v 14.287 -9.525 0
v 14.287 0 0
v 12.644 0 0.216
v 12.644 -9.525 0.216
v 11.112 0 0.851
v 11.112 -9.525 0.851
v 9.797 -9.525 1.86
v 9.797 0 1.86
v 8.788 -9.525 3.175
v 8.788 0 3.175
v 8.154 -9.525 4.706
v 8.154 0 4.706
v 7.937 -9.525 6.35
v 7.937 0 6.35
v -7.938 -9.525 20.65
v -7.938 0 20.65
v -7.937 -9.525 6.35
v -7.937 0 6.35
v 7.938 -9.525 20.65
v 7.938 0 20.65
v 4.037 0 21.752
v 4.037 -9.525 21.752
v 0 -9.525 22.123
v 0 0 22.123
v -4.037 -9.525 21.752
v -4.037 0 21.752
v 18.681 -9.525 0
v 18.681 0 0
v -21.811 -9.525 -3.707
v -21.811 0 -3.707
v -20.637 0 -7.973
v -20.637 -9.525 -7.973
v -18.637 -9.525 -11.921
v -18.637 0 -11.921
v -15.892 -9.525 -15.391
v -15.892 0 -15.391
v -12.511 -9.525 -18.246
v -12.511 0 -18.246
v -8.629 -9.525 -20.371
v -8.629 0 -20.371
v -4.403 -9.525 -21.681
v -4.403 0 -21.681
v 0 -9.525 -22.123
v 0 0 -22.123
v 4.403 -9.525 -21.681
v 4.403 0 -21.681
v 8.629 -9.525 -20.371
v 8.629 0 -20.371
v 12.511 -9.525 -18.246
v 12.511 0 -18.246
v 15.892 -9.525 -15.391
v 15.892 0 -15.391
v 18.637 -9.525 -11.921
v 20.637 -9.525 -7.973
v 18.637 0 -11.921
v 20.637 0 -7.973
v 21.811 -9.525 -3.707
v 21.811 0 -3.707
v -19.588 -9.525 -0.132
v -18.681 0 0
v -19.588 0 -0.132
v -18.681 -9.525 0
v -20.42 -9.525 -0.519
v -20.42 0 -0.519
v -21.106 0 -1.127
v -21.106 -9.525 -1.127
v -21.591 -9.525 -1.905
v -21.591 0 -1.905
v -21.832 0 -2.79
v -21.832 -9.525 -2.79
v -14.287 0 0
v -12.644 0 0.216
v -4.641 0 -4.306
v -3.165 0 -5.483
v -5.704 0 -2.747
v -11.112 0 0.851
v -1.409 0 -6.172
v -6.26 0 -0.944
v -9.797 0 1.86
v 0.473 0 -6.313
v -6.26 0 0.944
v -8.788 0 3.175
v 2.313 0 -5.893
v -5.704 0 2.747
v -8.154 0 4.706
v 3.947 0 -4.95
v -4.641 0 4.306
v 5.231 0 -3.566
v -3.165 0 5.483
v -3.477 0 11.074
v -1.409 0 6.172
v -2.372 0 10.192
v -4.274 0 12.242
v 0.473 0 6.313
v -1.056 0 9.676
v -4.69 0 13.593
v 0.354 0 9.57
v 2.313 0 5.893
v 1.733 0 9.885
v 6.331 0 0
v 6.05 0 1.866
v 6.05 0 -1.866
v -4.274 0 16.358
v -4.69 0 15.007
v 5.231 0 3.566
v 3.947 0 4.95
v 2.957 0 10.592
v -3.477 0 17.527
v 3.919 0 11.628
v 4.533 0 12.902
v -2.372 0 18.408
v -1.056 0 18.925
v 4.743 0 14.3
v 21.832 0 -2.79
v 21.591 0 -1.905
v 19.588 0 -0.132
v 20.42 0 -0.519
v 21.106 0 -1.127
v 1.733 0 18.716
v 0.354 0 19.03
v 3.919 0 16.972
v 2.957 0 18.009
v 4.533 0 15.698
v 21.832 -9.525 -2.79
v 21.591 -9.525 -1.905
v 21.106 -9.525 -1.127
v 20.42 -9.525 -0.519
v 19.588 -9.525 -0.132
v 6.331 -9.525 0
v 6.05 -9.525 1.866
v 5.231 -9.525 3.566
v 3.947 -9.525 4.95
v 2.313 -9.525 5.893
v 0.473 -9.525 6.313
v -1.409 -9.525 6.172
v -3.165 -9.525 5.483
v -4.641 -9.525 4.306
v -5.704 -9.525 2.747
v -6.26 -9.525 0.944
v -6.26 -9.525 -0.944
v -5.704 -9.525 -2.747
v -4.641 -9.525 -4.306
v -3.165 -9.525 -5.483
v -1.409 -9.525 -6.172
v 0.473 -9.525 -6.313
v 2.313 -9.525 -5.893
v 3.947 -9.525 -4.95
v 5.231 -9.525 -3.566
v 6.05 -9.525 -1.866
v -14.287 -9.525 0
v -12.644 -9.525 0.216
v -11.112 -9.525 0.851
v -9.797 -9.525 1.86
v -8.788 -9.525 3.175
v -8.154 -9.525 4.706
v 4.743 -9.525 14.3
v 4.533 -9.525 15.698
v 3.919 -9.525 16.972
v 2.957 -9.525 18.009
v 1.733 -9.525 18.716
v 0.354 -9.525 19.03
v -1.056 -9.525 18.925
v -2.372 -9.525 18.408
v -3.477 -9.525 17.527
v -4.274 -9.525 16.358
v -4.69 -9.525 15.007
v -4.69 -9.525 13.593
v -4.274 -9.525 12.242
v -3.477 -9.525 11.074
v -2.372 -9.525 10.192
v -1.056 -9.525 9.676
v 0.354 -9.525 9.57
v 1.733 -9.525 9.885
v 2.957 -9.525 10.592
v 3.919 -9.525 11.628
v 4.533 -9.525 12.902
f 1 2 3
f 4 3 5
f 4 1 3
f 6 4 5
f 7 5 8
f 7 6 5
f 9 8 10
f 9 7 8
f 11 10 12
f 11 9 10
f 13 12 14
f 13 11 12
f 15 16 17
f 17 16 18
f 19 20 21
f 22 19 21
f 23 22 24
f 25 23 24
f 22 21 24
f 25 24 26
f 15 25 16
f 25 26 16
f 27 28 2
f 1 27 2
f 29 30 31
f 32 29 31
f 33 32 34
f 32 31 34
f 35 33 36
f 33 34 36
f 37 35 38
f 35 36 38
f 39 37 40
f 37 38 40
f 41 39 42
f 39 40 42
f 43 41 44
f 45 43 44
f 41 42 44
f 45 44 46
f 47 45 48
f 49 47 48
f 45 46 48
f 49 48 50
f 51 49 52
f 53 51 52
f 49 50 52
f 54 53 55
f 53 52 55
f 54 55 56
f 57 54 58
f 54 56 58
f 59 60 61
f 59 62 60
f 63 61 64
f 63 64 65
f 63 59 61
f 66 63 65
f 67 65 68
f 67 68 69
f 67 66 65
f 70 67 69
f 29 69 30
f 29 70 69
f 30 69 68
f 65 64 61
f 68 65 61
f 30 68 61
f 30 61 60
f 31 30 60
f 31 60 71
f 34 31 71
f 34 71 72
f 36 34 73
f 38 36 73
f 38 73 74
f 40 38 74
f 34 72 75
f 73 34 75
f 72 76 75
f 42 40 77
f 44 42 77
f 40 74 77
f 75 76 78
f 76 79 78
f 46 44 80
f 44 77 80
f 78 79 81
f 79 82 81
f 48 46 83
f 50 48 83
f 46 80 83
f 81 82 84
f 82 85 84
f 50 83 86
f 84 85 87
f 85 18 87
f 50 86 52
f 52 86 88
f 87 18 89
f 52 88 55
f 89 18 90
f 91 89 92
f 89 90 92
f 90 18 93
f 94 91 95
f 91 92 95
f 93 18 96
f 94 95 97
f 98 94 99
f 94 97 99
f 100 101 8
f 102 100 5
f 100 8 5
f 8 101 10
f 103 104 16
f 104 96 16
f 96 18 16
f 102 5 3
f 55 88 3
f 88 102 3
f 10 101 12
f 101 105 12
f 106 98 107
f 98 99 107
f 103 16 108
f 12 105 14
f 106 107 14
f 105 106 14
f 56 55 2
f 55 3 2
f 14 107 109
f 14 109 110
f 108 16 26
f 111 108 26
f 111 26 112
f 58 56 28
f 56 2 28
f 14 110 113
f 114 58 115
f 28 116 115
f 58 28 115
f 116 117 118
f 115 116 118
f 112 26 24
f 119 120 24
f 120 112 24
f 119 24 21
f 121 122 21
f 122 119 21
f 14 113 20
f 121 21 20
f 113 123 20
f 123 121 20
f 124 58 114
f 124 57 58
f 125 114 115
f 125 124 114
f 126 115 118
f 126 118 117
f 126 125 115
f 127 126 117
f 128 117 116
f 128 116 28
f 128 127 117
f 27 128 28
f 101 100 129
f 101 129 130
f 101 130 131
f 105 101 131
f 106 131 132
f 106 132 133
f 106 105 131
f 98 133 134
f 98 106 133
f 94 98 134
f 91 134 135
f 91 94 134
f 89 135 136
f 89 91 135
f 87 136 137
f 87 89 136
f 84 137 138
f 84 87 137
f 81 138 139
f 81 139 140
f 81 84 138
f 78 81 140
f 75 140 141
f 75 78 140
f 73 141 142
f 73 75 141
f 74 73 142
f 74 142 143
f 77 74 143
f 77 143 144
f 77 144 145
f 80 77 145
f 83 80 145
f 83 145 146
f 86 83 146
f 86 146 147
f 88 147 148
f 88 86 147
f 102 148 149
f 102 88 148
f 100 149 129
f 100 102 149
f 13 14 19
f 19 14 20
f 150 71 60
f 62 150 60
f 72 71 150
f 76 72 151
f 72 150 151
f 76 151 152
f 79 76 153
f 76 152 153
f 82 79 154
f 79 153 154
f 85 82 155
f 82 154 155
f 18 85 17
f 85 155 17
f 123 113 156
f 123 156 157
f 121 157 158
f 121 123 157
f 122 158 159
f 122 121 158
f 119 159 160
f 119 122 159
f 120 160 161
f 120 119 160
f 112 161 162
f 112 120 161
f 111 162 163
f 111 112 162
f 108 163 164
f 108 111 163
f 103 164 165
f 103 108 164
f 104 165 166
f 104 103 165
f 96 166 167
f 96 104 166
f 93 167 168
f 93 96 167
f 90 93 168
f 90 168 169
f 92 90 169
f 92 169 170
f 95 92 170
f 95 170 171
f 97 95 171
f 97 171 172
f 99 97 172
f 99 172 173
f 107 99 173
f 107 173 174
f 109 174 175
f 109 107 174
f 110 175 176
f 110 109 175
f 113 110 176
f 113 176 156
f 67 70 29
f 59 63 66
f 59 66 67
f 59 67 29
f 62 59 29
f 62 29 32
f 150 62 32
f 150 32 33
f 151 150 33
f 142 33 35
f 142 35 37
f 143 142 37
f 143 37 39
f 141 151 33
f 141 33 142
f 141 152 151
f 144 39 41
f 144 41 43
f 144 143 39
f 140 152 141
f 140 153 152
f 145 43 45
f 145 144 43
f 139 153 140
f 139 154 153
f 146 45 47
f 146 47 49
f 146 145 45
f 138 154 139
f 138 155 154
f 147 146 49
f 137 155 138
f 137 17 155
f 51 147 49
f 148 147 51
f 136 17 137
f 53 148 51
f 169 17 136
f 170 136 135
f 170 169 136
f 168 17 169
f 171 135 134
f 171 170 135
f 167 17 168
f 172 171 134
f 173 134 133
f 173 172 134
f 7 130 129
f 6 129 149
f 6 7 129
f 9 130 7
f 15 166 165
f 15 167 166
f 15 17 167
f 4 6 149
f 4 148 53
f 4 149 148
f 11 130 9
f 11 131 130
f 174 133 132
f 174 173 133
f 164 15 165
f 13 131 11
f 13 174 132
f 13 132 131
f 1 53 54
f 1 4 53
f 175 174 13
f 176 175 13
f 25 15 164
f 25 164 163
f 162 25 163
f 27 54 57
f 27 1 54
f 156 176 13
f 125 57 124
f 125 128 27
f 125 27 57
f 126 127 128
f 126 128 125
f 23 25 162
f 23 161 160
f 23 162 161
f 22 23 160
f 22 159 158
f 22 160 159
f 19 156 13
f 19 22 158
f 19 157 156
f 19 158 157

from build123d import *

# Parameters (mm, degrees)
F0_R     = 6.33095
F0_R_2   = 4.74345
F1_DEPTH = 9.525
F2_R     = 6.35
F3_R     = 3.175


with BuildPart() as f1:
    # F0 (on Front) → F1 (new body)
    with BuildSketch(Plane.XZ):
        with BuildLine():
            Line((-7.9375, 0), (-22.1234, 0))
            ThreePointArc((-22.1234, 0), (0, -22.1234), (22.1234, 0))
            Line((22.1234, 0), (7.9375, 0))
            Line((7.9375, 0), (7.9375, 20.650446))
            ThreePointArc((7.9375, 20.650446), (0, 22.1234), (-7.9375, 20.650446))
            Line((-7.9375, 20.650446), (-7.9375, 0))
        make_face()
        Circle(F0_R, mode=Mode.SUBTRACT)
        with Locations((0, 14.3002)):
            Circle(F0_R_2, mode=Mode.SUBTRACT)
    extrude(amount=F1_DEPTH)

    # F2
    f2_edges = [f1.edges().sort_by_distance(p)[0] for p in [
        (-7.9375, -4.7625, 0),
        (7.9375, -4.7625, 0),
    ]]
    fillet(f2_edges, radius=F2_R)

    # F3
    f3_edges = [f1.edges().sort_by_distance(p)[0] for p in [
        (-22.1234, -4.7625, 0),
        (22.1234, -4.7625, 0),
    ]]
    fillet(f3_edges, radius=F3_R)


solid = f1.part
